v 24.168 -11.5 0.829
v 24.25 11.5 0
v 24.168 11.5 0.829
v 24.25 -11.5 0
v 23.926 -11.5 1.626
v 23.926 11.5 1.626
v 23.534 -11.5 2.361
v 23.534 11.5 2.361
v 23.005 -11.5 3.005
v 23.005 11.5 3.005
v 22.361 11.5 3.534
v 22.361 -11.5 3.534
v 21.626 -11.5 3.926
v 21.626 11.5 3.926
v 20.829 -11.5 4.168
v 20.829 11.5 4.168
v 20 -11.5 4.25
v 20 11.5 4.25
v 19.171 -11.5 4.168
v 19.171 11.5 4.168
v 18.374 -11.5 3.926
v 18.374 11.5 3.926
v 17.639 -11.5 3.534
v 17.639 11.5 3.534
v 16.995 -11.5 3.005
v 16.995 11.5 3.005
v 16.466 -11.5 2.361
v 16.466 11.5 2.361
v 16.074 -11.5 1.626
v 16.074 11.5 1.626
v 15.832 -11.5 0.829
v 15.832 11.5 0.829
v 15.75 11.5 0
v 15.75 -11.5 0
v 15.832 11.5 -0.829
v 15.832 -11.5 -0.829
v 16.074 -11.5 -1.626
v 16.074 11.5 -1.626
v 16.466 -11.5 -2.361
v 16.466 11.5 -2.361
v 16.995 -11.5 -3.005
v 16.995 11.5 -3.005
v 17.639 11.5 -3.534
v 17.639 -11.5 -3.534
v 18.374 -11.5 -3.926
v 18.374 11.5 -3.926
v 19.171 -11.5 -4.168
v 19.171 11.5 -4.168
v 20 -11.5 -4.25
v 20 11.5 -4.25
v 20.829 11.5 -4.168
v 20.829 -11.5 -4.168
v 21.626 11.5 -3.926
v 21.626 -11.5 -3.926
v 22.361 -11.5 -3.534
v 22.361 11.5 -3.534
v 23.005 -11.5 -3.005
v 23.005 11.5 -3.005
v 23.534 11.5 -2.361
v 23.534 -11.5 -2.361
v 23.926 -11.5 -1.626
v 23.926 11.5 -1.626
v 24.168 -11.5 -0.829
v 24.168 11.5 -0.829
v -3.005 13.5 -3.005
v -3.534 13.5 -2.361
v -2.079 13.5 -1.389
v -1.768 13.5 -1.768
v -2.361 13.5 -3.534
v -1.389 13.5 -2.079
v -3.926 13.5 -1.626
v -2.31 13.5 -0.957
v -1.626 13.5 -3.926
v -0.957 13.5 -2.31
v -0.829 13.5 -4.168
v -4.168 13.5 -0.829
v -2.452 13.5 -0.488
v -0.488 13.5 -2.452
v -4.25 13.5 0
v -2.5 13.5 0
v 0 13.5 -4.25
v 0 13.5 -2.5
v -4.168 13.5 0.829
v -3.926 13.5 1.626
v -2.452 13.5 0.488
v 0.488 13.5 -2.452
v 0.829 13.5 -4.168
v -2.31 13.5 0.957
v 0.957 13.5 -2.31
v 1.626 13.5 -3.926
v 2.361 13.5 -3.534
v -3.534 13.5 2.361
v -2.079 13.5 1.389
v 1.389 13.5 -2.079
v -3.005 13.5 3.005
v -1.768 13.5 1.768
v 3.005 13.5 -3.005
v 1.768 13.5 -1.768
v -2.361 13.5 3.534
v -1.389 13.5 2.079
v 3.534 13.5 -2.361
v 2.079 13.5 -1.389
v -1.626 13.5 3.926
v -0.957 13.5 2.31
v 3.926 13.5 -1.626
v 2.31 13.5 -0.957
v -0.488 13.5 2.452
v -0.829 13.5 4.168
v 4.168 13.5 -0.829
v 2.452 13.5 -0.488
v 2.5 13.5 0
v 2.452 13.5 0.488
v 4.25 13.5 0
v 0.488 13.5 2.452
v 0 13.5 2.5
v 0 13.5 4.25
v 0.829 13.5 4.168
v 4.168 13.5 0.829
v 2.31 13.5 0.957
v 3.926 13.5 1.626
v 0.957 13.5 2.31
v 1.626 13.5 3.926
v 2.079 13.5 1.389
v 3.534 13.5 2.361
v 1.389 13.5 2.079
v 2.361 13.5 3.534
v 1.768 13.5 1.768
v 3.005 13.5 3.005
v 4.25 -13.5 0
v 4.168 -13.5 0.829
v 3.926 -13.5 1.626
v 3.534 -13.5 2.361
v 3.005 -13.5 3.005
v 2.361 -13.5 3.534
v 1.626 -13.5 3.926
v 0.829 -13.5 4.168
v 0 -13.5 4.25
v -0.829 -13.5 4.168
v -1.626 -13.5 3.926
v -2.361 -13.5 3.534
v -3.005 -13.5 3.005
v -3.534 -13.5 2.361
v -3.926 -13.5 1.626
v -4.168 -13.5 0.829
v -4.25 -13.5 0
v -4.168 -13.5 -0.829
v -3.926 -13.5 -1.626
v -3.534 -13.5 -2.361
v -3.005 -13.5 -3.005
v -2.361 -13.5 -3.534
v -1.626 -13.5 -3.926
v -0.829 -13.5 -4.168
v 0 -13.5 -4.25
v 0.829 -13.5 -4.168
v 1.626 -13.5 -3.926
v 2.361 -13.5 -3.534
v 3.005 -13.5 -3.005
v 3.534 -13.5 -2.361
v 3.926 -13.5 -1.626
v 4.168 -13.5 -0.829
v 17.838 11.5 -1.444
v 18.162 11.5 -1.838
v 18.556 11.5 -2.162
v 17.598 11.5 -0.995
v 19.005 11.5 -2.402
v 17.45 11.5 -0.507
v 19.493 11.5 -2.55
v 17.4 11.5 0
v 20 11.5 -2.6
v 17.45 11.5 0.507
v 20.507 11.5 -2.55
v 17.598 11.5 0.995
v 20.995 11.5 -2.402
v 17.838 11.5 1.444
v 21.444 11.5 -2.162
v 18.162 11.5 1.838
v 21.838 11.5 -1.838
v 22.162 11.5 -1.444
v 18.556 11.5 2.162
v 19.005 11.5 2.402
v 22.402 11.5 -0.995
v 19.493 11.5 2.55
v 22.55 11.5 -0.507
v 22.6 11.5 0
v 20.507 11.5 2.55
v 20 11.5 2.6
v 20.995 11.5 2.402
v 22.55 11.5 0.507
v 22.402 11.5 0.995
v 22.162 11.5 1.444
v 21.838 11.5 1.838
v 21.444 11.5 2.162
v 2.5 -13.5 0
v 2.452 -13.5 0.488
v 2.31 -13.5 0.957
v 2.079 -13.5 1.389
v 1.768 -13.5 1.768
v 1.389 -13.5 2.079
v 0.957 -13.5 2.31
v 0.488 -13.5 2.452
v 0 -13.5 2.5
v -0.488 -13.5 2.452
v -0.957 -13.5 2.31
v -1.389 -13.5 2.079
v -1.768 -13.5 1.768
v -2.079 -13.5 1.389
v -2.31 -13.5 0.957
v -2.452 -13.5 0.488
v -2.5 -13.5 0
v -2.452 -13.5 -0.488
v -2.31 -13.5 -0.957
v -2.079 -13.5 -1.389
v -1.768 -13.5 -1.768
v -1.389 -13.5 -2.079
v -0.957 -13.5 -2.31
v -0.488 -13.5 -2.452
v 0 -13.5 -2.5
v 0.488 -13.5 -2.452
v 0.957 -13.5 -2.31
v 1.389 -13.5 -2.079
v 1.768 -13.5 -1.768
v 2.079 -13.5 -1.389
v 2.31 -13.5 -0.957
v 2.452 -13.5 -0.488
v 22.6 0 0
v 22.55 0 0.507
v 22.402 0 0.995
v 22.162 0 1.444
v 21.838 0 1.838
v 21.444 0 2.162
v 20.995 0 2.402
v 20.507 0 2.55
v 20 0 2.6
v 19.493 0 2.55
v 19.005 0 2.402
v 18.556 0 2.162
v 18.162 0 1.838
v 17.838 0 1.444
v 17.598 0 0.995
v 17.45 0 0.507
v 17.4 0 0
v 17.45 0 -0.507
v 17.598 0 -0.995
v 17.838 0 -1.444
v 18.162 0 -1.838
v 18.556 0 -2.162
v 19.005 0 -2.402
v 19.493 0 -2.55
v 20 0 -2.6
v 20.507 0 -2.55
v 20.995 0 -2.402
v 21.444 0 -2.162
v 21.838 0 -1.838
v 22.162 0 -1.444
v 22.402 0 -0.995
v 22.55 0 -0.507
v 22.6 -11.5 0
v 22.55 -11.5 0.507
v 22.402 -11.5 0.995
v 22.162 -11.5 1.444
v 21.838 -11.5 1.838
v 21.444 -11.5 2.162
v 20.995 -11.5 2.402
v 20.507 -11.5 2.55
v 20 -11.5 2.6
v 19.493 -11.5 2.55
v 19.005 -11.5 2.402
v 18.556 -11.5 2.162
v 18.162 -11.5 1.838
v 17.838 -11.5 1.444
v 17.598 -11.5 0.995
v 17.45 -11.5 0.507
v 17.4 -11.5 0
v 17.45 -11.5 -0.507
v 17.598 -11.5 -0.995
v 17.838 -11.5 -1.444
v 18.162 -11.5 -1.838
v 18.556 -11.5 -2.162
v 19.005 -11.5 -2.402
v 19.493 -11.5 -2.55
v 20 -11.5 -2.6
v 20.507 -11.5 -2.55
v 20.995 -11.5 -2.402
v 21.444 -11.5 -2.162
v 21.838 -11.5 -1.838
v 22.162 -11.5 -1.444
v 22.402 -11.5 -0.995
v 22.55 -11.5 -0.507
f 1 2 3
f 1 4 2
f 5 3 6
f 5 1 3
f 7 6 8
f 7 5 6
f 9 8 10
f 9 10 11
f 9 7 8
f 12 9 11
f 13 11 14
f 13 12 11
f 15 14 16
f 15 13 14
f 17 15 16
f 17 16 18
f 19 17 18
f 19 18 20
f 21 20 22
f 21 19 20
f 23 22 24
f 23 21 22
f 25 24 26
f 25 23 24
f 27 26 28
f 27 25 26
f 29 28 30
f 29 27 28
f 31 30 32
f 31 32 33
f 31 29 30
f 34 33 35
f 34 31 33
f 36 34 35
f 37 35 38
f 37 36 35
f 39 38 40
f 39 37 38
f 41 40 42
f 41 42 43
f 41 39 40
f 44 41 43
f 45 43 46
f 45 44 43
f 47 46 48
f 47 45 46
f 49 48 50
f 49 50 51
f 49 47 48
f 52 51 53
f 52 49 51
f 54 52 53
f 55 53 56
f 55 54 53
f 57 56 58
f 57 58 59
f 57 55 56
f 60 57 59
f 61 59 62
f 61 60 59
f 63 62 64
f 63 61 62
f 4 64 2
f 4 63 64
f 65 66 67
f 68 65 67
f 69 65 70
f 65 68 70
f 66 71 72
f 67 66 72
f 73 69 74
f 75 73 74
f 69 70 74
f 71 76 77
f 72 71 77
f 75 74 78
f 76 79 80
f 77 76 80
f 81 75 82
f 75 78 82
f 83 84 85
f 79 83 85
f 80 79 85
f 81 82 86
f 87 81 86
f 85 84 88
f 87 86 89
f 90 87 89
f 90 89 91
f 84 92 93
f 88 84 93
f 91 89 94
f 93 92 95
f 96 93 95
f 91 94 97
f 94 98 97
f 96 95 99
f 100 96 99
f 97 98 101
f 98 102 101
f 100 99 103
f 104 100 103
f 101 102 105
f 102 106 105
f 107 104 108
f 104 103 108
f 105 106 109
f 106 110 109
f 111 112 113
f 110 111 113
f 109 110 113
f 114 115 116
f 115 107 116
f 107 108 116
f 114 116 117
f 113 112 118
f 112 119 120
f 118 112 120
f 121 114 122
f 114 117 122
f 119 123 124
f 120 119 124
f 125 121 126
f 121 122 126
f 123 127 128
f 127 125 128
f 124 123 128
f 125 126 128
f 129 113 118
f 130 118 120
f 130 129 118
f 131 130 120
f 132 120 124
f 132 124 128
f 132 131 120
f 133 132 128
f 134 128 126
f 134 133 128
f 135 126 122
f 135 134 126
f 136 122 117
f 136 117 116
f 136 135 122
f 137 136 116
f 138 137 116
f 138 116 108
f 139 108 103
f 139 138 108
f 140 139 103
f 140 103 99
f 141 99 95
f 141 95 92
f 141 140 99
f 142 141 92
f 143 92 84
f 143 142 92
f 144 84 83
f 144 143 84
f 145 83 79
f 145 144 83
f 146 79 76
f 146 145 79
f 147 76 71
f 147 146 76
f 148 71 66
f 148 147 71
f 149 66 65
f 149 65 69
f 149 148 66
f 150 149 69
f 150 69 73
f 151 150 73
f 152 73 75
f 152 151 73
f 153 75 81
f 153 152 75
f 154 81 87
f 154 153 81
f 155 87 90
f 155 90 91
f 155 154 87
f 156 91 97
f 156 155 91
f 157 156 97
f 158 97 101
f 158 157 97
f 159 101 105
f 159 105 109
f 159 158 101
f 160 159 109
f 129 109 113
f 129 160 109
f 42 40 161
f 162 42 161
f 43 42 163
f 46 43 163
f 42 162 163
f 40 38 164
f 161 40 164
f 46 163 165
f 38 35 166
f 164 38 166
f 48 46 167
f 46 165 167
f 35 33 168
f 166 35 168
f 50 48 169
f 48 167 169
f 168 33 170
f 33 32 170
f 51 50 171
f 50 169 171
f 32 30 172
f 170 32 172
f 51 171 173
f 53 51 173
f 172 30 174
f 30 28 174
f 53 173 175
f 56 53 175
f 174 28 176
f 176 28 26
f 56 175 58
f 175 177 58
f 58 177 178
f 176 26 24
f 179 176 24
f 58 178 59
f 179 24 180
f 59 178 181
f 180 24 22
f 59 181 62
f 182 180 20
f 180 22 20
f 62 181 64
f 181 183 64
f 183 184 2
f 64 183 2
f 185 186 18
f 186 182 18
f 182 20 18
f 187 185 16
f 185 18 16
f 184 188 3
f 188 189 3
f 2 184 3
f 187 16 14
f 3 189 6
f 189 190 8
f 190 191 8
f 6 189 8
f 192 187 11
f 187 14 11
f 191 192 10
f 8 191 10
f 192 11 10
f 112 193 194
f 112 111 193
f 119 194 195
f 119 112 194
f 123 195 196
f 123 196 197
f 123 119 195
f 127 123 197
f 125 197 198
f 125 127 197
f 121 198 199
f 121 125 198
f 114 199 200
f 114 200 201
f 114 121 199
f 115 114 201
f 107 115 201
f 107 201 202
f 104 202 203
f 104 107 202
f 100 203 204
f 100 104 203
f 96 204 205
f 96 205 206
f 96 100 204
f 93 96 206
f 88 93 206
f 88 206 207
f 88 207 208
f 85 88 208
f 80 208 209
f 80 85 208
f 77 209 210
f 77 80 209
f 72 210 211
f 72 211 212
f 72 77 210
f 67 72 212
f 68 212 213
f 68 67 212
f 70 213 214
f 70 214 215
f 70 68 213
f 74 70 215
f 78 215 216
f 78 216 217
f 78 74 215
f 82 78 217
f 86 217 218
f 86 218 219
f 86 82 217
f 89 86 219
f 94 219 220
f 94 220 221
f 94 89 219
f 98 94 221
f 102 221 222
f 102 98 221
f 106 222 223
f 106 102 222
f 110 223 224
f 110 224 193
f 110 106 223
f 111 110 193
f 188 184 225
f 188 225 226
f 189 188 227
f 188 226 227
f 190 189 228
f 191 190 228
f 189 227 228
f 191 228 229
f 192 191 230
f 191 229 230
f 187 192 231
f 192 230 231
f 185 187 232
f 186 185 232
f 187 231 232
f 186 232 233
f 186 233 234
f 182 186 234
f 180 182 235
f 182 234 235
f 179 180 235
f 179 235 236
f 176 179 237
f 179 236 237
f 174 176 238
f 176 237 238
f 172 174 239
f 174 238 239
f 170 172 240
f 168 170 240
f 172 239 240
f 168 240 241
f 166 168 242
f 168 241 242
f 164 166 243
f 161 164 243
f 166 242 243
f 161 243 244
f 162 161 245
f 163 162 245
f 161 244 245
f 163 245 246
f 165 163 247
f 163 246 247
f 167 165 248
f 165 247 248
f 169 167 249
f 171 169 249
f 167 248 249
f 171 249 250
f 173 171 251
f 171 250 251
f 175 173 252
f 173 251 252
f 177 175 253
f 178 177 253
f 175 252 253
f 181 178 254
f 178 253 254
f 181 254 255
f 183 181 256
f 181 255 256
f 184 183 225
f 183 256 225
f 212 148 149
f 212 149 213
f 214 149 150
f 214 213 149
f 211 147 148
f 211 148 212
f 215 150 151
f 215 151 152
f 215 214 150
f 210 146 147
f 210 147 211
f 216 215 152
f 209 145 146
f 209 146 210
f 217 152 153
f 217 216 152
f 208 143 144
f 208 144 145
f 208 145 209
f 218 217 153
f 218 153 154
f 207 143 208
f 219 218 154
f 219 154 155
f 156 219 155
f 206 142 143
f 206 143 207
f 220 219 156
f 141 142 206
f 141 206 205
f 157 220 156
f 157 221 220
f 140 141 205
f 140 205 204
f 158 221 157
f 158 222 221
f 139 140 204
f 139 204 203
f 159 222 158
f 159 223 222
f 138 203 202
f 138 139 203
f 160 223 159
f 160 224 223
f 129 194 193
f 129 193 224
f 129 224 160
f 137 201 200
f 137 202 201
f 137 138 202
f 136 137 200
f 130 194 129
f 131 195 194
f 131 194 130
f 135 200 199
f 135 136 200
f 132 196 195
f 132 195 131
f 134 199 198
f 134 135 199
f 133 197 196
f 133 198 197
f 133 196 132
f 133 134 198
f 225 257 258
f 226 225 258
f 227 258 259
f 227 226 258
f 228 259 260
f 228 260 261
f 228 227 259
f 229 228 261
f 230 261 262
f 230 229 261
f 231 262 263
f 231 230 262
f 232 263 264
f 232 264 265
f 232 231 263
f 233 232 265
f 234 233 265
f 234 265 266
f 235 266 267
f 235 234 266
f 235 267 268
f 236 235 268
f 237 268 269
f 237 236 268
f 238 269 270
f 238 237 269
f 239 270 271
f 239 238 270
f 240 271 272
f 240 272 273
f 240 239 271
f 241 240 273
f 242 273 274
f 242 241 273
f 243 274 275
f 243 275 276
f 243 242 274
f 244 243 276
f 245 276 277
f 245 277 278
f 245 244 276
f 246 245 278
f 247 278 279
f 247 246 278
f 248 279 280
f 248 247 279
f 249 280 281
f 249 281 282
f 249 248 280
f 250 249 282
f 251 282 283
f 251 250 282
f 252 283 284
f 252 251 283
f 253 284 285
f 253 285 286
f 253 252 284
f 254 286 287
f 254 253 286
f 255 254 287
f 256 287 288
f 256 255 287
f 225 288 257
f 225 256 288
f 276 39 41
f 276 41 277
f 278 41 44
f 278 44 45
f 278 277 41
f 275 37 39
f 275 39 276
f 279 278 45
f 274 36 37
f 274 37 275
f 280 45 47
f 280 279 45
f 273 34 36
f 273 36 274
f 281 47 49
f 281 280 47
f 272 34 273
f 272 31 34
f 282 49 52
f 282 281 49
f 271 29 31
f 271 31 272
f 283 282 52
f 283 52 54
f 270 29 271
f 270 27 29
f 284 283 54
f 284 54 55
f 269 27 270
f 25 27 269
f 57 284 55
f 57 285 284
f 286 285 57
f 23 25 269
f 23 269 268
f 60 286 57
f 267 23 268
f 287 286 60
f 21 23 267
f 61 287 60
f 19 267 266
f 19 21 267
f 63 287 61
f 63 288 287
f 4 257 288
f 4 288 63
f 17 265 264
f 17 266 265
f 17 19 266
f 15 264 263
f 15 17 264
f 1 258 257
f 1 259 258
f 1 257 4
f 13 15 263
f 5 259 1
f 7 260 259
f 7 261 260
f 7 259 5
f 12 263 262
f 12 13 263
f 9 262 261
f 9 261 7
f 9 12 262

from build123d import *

# Parameters (mm, degrees)
F0_R          = 4.25
F0_R_2        = 2.5
F1_DEPTH      = 13.5
F2_R          = 4.25
F2_R_2        = 2.6
F3_DEPTH      = 11.5
F3_DEPTH_BACK = 11.5


with BuildPart() as f1:
    # F0 (on Front) → F1 (new body, symmetric)
    with BuildSketch(Plane.XZ):
        Circle(F0_R)
        Circle(F0_R_2, mode=Mode.SUBTRACT)
    extrude(amount=F1_DEPTH, both=True)


with BuildPart() as f3:
    # F2 (on Front) → F3 (new body, two sides)
    with BuildSketch(Plane.XZ) as f3_sk:
        with Locations((20, 0)):
            Circle(F2_R)
        with Locations((20, 0)):
            Circle(F2_R_2, mode=Mode.SUBTRACT)
    extrude(amount=F3_DEPTH)
    extrude(f3_sk.sketch, amount=-F3_DEPTH_BACK)


solid = Compound([f1.part, f3.part])
